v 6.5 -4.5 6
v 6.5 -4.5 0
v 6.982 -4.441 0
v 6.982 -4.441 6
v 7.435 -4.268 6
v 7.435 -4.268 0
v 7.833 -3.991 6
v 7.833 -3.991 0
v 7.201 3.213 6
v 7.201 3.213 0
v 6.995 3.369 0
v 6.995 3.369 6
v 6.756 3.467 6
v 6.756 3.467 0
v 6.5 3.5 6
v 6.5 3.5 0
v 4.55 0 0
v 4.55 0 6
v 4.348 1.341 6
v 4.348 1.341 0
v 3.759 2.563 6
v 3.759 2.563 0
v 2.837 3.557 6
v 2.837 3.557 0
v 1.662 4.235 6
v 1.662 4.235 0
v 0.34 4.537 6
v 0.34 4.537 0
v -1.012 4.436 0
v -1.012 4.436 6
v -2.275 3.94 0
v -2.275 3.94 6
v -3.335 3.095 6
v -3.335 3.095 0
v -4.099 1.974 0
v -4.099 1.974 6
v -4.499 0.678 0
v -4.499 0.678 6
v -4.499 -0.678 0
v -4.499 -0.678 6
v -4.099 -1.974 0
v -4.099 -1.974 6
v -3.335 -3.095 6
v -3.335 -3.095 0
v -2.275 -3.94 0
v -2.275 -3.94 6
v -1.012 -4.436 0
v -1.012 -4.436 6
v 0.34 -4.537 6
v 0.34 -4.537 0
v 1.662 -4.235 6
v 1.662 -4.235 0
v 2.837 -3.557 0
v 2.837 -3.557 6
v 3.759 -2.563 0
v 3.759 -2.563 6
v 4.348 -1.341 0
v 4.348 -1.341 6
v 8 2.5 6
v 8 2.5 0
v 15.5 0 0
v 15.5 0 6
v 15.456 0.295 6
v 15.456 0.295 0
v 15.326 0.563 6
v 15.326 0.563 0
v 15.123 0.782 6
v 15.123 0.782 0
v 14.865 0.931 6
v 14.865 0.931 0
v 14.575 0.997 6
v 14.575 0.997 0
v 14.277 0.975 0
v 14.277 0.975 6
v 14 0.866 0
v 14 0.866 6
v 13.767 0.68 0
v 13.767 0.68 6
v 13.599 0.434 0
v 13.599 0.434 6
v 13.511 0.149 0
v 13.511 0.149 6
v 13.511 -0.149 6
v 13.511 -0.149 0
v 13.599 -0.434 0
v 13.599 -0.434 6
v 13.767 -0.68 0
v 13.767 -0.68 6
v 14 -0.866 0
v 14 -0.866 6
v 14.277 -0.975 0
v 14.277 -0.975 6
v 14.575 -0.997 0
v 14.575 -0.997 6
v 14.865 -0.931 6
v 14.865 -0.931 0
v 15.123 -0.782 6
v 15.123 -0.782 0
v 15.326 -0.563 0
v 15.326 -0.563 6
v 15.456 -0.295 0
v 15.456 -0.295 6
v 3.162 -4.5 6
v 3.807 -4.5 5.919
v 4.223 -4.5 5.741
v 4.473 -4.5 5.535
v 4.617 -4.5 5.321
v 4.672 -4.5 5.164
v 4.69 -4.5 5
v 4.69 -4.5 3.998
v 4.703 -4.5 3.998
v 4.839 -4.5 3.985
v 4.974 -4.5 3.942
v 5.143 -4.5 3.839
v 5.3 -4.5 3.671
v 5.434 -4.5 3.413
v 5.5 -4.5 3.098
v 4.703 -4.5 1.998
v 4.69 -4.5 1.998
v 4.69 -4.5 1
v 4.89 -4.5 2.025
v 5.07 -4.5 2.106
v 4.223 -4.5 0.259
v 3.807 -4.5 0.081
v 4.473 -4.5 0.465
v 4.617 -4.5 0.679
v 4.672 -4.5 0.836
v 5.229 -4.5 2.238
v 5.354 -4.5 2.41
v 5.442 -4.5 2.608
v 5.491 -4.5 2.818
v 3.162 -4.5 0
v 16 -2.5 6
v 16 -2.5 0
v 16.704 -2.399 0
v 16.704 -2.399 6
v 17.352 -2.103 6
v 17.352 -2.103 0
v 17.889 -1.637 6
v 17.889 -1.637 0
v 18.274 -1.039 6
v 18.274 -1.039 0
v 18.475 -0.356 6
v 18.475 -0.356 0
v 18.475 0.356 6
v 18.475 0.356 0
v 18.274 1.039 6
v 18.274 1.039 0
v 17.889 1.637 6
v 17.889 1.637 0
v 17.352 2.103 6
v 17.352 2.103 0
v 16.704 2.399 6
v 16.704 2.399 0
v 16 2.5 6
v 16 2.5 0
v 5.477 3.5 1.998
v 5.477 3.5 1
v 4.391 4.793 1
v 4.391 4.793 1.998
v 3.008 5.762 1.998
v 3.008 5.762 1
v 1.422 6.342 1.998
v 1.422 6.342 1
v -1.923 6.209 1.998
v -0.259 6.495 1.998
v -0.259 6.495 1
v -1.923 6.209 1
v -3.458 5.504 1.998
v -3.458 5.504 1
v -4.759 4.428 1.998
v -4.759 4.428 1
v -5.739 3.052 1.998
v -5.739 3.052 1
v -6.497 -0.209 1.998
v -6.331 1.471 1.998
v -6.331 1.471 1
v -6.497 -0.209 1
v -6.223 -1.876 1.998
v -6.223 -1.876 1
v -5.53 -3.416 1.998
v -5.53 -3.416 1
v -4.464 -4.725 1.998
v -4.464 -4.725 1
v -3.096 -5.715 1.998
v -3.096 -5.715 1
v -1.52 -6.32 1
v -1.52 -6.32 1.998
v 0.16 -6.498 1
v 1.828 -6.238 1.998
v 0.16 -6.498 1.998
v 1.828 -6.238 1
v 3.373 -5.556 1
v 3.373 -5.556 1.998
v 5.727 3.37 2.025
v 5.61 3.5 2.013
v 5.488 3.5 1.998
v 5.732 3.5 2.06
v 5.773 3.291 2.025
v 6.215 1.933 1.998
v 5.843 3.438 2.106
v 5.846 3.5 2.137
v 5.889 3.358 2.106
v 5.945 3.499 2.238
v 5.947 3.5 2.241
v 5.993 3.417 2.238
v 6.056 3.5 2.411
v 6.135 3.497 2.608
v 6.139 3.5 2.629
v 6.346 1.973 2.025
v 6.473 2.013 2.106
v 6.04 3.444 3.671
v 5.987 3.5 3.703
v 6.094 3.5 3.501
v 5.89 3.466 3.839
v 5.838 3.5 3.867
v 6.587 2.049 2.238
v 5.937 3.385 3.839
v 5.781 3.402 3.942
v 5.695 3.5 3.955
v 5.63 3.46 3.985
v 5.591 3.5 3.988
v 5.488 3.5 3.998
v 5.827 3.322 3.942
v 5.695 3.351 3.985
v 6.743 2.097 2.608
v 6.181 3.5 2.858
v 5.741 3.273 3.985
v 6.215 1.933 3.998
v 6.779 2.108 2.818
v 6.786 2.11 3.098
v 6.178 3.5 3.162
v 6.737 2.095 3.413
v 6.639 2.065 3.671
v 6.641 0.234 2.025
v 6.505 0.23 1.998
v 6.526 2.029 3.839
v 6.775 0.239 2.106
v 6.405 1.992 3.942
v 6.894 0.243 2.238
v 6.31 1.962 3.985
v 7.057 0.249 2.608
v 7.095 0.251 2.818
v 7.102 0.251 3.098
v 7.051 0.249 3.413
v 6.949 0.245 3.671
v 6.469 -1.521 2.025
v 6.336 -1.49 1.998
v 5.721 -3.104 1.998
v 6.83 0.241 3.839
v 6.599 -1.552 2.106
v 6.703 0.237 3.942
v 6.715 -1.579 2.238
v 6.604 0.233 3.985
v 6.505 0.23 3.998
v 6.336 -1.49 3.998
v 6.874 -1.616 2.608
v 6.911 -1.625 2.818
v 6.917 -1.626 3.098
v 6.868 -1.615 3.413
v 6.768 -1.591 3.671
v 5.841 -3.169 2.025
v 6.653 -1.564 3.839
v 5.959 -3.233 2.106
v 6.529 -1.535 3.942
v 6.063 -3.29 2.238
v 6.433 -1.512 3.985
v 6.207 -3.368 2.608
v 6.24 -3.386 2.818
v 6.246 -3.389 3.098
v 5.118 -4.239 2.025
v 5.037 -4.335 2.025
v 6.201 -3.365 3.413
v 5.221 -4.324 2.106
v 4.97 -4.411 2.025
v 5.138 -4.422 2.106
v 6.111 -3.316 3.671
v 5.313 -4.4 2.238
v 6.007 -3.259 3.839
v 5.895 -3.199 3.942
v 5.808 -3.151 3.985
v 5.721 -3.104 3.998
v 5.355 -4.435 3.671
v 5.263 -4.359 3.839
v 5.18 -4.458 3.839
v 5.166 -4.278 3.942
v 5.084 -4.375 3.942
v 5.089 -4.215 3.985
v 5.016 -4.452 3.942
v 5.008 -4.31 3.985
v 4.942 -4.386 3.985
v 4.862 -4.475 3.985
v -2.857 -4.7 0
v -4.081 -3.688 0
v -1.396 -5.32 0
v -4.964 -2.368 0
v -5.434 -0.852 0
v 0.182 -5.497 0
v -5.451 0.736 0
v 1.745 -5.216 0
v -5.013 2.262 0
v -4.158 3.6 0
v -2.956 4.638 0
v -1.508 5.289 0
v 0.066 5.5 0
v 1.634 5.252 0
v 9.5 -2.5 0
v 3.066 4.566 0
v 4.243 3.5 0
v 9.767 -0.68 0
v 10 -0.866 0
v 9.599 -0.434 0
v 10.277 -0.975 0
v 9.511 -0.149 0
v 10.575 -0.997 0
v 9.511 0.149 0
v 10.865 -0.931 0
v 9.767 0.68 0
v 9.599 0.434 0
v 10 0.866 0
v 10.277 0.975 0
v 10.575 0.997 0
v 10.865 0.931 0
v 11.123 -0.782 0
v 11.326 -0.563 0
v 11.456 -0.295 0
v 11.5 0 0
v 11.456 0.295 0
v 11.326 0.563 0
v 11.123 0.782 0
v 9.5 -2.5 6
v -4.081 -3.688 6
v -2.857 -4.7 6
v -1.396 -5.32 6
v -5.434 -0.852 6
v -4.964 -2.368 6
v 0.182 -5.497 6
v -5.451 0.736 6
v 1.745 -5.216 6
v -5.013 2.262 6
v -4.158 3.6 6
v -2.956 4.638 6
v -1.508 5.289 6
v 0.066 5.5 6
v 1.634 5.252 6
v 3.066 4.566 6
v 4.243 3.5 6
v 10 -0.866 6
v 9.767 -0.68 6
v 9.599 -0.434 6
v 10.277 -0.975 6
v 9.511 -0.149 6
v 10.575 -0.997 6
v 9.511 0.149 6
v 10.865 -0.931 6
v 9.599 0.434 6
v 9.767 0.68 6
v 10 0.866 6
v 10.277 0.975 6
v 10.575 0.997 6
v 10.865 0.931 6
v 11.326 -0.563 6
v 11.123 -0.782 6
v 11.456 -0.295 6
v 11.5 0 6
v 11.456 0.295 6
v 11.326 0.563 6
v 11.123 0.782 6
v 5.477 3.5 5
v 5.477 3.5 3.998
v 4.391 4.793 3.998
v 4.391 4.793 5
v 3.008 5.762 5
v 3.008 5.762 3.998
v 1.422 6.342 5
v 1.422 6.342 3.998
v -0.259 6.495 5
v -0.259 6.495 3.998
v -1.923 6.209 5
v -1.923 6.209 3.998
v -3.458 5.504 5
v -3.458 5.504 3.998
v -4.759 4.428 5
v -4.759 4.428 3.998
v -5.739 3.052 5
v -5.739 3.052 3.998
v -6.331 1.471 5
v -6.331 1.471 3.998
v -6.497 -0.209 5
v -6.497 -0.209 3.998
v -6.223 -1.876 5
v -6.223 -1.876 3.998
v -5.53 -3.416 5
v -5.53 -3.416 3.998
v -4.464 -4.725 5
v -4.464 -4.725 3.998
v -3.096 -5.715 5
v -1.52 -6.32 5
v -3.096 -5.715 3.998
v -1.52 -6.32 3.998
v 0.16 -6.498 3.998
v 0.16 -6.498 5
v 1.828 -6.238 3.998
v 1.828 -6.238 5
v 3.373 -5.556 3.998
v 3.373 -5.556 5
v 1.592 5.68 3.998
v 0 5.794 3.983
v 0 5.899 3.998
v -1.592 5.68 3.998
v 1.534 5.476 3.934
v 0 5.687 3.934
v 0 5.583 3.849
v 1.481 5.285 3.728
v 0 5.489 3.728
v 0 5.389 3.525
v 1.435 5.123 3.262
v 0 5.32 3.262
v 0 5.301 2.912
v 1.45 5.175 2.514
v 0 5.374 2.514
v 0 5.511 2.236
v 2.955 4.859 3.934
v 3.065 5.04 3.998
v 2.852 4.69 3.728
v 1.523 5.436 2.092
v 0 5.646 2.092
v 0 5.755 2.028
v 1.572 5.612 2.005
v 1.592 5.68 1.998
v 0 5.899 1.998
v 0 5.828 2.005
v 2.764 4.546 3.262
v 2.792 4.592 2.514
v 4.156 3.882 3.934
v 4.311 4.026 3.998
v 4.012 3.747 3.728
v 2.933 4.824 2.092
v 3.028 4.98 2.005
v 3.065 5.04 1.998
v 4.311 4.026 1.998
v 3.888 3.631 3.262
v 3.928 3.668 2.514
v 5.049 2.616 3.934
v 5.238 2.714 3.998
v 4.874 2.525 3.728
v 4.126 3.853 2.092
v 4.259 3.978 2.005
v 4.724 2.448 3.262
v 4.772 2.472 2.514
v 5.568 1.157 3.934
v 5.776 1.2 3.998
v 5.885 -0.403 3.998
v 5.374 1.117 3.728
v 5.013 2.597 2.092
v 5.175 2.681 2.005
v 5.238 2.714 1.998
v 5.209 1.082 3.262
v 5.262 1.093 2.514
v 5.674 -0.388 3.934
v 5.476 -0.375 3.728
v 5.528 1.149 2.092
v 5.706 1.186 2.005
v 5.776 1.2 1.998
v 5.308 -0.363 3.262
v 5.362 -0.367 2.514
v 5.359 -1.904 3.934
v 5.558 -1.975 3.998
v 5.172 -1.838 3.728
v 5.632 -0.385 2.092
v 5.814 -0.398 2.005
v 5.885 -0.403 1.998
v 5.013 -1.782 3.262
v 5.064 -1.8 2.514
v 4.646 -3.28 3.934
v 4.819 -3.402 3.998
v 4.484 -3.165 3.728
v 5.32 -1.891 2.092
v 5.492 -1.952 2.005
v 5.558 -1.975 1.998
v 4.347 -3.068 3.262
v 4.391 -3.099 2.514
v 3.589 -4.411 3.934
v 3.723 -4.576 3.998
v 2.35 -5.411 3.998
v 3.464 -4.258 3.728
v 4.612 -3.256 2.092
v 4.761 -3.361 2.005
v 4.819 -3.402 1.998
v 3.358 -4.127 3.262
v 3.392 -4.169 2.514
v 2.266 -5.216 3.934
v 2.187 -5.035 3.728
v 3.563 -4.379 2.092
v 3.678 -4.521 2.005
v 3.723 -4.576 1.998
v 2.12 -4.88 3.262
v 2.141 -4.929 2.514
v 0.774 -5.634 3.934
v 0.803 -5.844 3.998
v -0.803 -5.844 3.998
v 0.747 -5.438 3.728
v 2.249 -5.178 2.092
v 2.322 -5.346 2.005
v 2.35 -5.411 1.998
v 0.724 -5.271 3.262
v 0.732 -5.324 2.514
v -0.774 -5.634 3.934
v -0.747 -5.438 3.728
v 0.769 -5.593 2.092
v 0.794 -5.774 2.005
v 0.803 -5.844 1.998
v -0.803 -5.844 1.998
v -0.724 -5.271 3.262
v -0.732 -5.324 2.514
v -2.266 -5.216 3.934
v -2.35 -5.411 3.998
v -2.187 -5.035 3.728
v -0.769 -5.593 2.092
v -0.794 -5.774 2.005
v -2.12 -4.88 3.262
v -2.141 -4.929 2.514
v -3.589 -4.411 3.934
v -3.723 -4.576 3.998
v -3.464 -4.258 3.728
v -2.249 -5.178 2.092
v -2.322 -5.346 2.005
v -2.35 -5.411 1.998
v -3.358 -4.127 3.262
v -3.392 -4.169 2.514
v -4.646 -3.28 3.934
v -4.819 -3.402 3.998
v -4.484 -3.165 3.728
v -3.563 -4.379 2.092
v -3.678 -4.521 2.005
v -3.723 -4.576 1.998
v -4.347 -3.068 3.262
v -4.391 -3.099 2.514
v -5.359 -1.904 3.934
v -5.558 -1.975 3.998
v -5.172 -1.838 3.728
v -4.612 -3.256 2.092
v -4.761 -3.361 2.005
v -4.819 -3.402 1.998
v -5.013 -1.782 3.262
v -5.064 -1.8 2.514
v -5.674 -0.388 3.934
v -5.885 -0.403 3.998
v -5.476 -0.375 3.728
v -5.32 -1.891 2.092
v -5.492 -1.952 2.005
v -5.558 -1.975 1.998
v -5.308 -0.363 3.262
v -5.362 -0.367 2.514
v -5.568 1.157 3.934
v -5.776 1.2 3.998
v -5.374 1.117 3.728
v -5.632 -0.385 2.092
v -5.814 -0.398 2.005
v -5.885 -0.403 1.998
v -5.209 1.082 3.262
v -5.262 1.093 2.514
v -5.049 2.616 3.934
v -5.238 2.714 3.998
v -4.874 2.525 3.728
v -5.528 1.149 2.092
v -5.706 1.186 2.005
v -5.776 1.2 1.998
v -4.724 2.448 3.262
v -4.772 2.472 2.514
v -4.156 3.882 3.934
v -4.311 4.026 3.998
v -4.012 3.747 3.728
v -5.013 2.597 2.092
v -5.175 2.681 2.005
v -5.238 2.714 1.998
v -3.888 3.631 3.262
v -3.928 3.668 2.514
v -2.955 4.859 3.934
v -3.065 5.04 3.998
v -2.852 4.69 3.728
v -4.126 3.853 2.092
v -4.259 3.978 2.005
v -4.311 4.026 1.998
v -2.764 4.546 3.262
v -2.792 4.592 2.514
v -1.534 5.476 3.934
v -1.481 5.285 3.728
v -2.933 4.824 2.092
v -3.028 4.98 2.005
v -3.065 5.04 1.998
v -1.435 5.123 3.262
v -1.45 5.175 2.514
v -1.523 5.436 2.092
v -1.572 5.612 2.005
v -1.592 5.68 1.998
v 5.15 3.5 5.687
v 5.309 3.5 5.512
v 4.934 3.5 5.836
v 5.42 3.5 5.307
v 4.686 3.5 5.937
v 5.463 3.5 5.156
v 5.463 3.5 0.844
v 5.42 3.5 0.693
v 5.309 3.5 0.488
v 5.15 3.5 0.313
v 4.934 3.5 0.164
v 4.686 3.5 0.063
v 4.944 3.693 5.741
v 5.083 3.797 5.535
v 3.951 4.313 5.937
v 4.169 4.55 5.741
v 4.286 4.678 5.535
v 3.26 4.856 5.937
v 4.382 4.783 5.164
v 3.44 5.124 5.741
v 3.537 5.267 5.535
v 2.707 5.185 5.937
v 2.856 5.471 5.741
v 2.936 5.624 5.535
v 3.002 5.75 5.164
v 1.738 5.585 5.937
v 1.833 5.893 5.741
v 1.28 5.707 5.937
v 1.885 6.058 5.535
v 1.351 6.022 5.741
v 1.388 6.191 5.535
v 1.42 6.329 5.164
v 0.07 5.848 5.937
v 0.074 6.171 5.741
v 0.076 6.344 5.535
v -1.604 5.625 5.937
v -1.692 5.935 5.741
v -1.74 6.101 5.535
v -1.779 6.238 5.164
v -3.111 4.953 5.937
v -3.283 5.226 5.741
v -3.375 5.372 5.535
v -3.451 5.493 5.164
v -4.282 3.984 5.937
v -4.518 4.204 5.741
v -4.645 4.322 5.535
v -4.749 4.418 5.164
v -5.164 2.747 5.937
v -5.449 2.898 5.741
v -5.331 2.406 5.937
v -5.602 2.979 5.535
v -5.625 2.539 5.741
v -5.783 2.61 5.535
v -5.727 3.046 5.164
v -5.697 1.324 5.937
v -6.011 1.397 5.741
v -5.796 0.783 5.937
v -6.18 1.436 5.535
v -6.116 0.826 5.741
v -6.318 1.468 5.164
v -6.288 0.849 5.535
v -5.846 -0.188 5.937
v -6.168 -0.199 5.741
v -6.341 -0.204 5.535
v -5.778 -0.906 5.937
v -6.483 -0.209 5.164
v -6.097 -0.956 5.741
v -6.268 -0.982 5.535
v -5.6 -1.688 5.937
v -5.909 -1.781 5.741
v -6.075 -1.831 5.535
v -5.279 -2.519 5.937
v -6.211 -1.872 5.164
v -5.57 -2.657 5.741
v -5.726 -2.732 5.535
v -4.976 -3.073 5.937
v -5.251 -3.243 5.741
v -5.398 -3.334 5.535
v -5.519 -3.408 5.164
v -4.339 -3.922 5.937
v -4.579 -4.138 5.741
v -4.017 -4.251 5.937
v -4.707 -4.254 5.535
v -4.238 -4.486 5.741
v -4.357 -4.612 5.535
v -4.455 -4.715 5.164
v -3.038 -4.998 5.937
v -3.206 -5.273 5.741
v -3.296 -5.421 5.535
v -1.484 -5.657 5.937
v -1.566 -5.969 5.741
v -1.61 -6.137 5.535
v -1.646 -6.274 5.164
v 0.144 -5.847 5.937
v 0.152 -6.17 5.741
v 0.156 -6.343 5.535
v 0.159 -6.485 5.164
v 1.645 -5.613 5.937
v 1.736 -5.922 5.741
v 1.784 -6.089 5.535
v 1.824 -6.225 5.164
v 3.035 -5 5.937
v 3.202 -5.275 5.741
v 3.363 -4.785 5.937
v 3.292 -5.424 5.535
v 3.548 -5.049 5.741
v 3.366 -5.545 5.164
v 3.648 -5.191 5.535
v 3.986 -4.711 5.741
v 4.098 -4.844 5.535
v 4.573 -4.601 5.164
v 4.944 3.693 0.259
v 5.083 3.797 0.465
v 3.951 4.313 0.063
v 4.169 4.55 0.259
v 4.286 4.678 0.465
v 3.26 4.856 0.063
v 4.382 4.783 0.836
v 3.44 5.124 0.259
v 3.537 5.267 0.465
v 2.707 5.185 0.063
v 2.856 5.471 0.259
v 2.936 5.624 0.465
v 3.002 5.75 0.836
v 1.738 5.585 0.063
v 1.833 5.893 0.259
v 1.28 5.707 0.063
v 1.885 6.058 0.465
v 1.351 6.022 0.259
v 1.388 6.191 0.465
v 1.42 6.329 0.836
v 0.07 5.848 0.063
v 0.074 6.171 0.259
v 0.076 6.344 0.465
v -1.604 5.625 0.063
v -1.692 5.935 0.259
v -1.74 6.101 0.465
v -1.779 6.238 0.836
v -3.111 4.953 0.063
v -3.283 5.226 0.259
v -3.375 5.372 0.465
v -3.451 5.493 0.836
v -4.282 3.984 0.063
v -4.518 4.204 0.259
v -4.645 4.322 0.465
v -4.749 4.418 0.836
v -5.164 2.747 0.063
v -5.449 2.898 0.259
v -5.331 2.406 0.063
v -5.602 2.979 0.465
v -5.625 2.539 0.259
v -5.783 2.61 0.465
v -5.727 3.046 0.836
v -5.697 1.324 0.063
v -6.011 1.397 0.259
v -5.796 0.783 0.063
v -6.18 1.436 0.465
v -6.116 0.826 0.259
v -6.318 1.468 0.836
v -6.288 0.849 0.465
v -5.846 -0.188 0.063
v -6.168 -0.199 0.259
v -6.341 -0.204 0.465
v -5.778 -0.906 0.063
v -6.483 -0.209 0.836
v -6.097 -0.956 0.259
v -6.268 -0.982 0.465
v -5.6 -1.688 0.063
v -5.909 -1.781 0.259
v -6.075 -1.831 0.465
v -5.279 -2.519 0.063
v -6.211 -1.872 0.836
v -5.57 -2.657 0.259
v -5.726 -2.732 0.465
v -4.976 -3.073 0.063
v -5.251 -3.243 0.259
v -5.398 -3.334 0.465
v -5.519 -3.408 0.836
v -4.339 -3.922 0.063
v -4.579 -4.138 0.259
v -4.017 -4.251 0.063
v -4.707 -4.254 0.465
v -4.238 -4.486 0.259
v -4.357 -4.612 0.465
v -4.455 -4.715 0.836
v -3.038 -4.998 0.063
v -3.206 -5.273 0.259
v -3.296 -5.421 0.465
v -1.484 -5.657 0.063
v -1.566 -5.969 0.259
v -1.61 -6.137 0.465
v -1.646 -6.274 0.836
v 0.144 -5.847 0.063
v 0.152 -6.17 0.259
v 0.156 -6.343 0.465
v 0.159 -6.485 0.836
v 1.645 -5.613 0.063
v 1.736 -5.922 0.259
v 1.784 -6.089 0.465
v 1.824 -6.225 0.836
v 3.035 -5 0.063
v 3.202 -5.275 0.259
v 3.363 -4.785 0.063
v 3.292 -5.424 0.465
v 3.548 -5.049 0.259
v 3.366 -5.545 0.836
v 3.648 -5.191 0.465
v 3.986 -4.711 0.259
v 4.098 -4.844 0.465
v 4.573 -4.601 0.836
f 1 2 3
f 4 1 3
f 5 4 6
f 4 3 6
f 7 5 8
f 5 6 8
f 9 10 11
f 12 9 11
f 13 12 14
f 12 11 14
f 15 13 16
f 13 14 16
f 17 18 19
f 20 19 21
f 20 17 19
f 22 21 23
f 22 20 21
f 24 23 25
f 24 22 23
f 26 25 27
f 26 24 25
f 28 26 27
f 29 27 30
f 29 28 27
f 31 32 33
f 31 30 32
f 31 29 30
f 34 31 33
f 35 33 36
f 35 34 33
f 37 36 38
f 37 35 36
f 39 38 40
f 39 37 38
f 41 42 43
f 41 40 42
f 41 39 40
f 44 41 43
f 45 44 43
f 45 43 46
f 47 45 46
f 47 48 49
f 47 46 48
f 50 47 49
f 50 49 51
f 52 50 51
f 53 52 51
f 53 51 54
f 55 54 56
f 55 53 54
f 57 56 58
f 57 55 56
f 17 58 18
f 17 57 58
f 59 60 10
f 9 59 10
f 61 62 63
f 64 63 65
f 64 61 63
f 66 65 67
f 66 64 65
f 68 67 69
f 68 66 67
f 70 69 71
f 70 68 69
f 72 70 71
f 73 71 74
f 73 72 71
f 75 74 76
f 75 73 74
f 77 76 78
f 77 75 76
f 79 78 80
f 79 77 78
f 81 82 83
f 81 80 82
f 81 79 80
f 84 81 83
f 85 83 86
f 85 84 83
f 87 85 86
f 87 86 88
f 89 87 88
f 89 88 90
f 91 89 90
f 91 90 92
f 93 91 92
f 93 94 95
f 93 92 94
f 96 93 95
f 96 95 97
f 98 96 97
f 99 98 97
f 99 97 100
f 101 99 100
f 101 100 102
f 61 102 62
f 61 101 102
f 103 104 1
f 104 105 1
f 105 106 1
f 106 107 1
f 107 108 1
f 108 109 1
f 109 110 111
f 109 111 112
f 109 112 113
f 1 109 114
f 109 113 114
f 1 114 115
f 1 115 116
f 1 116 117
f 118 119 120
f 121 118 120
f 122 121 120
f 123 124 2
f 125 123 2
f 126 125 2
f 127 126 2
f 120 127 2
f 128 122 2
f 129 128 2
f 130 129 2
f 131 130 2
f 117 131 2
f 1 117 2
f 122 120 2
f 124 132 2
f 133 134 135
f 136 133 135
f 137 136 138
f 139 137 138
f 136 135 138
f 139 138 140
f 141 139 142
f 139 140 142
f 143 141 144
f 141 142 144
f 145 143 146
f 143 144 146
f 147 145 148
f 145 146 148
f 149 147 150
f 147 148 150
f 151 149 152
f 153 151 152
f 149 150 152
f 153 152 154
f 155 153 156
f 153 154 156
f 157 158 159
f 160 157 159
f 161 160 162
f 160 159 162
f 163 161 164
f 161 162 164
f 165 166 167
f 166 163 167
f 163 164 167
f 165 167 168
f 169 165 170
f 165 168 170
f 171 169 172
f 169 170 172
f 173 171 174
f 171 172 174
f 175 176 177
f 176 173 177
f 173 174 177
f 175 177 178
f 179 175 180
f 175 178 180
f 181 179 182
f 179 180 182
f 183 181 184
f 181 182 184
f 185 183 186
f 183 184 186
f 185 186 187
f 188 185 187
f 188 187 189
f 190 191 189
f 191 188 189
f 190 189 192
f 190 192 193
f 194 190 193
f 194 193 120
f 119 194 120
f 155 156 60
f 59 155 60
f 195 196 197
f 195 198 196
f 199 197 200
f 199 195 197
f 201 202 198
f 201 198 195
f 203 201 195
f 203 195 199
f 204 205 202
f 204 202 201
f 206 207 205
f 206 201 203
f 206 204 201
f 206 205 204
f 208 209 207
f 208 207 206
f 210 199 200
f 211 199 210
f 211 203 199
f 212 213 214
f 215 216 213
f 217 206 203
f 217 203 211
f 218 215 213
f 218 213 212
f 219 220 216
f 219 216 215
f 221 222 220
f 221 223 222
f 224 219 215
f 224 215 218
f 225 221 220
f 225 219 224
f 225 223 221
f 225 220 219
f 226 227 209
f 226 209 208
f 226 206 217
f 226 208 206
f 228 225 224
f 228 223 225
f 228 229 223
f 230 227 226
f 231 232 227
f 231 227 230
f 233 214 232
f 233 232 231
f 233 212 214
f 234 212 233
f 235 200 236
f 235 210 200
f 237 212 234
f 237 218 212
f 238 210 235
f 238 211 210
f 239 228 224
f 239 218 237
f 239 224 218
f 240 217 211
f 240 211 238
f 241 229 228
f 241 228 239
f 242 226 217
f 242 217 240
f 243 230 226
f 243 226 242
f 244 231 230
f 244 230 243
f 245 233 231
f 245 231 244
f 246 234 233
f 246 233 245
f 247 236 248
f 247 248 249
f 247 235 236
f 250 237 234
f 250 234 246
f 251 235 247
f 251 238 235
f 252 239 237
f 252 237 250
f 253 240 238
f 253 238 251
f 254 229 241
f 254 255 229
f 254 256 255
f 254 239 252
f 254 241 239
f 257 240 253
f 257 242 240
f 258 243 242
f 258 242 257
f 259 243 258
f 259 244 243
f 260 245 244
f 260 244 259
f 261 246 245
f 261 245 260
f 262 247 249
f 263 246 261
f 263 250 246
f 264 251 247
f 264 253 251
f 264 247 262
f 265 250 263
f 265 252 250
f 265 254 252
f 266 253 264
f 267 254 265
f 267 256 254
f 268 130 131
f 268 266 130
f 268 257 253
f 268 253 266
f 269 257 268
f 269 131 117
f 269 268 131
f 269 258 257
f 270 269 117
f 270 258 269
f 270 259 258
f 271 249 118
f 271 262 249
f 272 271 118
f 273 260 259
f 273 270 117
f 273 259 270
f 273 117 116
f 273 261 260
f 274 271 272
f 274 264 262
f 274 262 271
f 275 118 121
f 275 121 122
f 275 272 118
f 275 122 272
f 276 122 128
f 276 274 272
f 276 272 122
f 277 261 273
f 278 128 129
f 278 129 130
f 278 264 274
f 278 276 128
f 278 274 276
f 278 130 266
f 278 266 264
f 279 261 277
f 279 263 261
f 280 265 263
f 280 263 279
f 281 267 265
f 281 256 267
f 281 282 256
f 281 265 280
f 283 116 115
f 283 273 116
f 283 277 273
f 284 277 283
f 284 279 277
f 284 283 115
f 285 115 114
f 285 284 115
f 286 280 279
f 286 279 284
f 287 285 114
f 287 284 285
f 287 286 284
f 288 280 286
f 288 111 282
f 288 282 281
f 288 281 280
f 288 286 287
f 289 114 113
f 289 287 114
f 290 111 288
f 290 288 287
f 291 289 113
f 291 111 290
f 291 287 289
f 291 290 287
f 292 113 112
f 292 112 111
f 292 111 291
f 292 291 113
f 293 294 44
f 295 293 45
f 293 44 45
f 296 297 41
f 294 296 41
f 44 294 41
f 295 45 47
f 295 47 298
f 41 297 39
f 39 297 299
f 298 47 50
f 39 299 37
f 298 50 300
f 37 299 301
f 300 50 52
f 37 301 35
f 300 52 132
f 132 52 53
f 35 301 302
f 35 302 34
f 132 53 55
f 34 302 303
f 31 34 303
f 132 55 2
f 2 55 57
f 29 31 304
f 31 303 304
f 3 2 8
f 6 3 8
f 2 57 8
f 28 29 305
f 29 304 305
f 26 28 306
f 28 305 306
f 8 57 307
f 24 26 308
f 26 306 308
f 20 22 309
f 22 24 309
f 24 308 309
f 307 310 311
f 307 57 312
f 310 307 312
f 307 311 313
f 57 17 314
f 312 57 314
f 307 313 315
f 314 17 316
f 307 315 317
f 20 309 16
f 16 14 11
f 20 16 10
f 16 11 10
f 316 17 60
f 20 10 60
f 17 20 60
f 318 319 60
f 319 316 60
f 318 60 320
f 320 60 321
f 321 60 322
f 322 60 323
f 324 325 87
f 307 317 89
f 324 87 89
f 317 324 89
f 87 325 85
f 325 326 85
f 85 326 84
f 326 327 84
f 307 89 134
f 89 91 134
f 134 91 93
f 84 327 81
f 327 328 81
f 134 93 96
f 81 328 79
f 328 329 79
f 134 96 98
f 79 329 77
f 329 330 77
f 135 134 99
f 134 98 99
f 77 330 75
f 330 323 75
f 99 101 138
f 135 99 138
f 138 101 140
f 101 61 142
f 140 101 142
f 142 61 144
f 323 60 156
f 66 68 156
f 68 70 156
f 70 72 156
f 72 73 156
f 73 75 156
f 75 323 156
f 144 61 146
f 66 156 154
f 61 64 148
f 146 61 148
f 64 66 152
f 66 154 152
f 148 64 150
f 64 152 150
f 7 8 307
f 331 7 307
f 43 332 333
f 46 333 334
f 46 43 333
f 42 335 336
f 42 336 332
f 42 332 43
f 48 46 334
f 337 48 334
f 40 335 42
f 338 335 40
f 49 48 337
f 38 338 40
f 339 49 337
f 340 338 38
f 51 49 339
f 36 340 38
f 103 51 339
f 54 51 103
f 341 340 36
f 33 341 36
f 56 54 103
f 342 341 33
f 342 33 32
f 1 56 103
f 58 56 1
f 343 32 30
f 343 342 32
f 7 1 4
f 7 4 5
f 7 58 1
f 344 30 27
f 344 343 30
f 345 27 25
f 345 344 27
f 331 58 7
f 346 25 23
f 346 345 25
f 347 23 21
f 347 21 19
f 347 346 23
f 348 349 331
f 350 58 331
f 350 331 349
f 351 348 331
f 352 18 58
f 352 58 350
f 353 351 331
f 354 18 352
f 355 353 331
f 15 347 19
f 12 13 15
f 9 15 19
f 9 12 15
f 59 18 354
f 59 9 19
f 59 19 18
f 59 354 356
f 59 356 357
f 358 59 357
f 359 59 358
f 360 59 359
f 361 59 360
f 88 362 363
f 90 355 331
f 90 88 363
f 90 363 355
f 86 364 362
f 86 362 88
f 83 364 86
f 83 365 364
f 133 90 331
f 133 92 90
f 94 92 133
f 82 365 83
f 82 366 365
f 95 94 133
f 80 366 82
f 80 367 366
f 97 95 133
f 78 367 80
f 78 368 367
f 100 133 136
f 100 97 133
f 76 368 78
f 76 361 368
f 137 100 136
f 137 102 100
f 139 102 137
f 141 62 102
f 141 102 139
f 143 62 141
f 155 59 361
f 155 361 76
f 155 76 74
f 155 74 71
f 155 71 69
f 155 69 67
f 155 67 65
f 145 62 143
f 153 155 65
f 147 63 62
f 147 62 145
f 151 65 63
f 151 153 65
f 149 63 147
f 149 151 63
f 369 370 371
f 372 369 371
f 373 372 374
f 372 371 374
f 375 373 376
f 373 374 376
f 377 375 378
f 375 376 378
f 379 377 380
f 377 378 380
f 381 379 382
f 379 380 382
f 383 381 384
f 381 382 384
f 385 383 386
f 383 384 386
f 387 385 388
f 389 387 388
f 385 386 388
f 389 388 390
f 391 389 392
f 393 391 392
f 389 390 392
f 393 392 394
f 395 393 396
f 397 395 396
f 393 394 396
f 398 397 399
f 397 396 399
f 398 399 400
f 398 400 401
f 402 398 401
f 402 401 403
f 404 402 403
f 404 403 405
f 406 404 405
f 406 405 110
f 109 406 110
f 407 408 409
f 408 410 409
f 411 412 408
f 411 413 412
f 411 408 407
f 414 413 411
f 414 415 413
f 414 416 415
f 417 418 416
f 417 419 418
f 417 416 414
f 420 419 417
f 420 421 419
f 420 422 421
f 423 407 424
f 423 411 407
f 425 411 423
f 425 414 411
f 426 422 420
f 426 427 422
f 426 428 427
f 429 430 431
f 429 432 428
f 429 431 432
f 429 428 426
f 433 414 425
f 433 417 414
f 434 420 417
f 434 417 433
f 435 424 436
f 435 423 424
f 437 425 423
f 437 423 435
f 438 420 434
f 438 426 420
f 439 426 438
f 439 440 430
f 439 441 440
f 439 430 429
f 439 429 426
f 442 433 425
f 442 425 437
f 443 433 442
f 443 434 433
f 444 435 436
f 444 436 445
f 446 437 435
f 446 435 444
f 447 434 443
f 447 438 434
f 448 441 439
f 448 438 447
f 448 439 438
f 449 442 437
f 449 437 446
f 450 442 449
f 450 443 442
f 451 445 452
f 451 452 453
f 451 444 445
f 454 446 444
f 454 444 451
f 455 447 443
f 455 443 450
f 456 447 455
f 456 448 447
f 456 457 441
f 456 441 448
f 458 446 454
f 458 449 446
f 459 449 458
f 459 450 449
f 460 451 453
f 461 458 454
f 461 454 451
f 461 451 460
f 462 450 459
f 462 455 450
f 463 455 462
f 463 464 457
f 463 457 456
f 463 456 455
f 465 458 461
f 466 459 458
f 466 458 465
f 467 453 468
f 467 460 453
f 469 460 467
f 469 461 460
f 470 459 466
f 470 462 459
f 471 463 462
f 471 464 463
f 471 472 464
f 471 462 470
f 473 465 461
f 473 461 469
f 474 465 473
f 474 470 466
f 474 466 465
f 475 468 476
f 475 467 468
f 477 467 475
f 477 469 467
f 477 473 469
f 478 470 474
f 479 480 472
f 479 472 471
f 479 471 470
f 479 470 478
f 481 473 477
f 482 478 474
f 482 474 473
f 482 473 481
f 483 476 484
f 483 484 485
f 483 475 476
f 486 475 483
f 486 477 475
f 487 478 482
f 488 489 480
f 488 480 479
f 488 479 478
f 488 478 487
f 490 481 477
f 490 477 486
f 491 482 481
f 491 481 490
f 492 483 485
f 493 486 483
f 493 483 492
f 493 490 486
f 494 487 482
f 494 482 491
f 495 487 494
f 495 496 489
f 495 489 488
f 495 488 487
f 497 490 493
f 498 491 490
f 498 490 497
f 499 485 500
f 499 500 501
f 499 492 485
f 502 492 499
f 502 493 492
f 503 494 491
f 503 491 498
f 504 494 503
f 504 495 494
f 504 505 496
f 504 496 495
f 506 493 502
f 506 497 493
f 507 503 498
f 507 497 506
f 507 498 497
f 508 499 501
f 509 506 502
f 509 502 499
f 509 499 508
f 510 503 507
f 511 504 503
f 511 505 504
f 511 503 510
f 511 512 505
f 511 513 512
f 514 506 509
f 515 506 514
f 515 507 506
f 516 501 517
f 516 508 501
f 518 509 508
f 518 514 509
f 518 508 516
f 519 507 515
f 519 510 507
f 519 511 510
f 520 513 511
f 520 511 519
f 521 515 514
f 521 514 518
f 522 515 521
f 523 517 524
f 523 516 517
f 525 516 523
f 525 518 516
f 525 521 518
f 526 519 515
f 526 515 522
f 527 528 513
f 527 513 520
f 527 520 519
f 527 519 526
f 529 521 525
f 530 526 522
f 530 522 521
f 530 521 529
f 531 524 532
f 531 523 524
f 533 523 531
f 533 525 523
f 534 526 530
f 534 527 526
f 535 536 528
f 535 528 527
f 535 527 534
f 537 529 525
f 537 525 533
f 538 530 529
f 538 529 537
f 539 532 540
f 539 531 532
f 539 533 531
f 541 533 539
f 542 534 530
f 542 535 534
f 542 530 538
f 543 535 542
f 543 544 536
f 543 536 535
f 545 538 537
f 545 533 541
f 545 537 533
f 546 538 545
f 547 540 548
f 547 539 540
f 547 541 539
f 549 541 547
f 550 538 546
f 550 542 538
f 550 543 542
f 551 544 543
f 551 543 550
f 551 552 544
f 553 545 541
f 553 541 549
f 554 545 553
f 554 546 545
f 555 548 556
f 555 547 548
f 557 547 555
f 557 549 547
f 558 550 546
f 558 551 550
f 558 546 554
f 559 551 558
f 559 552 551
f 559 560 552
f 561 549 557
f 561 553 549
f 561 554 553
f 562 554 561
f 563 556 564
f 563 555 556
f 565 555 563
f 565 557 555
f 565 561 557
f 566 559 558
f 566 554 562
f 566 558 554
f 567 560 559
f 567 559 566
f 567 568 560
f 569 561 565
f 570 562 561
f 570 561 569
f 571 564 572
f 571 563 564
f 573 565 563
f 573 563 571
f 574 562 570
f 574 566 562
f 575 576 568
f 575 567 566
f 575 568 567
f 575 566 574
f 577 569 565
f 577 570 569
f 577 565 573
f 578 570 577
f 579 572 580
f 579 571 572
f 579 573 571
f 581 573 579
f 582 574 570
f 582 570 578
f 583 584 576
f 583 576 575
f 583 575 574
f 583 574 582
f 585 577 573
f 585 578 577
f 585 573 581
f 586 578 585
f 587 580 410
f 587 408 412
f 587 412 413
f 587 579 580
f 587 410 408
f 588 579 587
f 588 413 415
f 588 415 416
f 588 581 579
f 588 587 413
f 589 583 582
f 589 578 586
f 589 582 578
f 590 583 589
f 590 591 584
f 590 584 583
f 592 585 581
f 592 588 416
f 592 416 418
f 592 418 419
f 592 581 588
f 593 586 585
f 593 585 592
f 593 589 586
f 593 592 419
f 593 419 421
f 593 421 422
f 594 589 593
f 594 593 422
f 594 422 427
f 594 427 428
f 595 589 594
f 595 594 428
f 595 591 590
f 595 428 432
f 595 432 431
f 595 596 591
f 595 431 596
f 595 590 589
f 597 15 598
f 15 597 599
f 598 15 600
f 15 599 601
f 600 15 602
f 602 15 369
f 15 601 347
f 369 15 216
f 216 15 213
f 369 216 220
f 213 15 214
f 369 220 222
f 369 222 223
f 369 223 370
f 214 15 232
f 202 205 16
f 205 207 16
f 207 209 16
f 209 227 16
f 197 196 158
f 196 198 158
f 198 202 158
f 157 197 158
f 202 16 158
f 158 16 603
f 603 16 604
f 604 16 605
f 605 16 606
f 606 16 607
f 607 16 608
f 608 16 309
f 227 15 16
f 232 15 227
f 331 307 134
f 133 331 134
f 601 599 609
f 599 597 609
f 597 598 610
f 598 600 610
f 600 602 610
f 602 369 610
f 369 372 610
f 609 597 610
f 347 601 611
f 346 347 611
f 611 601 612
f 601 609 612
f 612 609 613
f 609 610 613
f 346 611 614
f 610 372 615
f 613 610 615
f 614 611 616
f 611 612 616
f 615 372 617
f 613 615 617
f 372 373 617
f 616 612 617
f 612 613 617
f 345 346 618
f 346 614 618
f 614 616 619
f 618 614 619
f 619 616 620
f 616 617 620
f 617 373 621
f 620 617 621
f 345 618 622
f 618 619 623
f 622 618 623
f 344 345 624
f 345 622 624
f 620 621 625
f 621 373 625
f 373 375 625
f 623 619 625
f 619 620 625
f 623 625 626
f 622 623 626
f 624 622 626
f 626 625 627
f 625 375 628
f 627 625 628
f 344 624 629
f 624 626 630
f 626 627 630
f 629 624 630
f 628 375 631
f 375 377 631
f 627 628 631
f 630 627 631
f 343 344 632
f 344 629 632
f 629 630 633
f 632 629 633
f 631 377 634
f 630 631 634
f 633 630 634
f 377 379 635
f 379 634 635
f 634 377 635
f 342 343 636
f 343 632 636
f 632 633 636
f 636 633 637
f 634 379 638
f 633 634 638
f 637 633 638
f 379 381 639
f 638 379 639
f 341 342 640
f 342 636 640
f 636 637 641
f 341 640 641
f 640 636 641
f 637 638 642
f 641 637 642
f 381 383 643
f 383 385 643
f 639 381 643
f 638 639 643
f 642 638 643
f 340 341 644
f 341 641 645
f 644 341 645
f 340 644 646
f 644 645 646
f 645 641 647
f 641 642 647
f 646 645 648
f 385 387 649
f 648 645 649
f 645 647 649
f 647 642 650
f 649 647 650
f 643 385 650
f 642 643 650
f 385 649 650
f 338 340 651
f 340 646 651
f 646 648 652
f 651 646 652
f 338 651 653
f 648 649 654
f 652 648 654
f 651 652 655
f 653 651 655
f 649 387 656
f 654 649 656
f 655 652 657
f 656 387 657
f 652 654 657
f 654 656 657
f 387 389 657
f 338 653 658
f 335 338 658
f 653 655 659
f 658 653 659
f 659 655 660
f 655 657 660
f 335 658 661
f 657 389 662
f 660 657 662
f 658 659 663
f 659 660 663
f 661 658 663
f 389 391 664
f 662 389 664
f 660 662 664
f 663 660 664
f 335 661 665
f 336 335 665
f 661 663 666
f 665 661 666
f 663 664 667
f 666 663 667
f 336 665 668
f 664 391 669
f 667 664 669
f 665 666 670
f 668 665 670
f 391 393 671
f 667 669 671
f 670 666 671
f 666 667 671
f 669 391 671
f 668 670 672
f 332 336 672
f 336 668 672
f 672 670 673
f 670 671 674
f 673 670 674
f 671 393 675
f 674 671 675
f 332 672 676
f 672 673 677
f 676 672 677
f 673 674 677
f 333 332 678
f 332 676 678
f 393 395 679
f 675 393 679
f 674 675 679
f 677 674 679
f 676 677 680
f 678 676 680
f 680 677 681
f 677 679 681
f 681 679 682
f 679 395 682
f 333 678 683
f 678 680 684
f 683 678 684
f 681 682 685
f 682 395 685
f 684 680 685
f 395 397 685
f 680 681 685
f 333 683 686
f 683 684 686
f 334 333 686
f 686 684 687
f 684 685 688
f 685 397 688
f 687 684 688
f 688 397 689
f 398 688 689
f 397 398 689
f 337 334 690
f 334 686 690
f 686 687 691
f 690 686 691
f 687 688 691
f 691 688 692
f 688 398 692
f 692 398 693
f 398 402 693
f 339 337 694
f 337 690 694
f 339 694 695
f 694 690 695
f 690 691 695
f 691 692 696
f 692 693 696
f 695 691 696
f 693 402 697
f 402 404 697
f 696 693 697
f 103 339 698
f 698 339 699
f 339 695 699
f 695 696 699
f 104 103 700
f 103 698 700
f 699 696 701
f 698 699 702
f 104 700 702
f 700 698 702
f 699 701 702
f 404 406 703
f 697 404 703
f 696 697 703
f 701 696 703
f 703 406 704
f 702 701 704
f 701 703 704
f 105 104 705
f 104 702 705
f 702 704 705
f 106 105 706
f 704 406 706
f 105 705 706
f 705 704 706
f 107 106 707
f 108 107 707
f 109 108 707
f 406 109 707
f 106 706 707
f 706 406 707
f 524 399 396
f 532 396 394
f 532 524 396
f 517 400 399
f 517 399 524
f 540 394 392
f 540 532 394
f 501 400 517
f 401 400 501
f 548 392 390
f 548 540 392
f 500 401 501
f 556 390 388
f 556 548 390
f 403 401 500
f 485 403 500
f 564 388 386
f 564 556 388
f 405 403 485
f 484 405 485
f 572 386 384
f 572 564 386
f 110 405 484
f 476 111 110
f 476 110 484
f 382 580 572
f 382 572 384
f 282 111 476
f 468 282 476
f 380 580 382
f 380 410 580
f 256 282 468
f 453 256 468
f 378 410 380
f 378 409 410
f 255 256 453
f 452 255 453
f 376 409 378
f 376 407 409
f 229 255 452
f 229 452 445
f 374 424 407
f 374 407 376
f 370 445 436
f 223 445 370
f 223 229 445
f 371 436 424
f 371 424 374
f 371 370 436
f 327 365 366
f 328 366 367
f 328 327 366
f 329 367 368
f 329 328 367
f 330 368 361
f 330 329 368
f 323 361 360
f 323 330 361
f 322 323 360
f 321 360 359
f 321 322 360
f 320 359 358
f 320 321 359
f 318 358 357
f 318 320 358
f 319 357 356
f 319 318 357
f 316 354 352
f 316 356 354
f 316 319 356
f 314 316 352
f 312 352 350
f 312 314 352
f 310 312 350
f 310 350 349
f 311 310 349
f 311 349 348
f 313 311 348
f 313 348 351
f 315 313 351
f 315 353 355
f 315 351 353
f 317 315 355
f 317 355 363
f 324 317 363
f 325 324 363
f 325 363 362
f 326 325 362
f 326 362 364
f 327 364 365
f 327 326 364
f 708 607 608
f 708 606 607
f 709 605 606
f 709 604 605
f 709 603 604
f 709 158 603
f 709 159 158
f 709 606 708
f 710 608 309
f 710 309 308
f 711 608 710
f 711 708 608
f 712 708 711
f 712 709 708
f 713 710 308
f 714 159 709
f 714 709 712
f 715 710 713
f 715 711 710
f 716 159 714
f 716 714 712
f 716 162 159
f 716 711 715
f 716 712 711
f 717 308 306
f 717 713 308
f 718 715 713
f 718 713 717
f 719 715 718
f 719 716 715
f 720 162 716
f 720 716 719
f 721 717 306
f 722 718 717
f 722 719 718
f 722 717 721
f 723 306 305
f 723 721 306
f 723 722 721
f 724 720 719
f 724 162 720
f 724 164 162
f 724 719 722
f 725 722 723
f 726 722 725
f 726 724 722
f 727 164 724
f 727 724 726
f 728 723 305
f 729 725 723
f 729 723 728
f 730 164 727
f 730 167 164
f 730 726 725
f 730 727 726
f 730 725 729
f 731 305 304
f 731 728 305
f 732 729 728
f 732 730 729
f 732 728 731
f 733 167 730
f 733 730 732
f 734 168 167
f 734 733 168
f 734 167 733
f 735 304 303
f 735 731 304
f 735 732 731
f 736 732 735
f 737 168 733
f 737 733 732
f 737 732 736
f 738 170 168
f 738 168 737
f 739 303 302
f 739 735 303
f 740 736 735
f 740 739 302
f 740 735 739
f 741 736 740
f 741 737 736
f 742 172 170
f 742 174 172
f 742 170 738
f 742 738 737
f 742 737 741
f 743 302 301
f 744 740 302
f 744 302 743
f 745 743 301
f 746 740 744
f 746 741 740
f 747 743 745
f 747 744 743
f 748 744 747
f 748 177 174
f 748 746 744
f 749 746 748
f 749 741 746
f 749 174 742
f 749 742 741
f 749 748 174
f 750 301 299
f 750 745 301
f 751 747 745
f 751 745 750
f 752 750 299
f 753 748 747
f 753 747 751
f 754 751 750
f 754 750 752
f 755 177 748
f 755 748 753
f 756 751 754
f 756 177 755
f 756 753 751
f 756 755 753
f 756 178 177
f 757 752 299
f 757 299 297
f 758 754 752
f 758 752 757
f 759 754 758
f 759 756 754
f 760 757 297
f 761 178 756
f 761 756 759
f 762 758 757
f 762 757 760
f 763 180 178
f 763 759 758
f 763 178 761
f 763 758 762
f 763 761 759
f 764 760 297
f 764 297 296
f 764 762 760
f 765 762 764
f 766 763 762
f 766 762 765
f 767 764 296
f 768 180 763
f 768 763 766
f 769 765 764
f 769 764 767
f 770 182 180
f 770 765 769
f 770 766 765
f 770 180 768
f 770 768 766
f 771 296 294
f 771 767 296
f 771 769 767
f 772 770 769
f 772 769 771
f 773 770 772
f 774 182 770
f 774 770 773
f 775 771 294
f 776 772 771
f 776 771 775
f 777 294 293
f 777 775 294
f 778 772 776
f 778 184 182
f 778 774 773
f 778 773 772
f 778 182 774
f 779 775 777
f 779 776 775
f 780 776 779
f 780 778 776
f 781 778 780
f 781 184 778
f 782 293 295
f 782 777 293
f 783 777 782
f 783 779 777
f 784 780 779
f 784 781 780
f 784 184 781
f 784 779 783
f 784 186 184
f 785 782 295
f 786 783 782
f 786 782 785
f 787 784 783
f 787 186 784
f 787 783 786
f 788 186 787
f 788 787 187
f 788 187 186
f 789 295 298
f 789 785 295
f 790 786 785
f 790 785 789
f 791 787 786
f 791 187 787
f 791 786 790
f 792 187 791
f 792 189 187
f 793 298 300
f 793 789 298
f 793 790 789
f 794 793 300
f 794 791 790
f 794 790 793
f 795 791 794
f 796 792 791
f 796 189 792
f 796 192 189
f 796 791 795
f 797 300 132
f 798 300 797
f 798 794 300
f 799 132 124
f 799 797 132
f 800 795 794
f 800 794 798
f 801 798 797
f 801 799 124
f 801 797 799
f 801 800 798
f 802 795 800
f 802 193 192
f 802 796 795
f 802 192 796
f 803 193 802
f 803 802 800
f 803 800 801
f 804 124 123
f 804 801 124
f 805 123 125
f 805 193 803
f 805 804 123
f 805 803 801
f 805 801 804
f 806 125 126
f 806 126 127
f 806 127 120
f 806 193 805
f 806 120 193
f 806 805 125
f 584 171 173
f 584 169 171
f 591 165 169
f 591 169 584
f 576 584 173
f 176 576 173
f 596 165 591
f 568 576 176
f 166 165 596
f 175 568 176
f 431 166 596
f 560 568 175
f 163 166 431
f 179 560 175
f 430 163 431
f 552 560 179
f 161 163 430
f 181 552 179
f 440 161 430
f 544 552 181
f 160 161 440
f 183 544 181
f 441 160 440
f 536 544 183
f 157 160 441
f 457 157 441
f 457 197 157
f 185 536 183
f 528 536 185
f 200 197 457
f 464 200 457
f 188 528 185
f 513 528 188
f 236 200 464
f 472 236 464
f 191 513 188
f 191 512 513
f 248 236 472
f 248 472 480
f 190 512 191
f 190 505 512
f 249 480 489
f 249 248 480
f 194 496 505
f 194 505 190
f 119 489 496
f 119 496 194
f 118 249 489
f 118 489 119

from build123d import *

# Parameters (mm, degrees)
BOSS_EXTRUDE1_DEPTH = 6
SKETCH1_5_R         = 4.55
CUT_EXTRUDE2_DEPTH  = 21.506096654
SKETCH1_6_R         = 1
CUT_EXTRUDE3_DEPTH  = 21.506096654
FILLET1_R           = 1


with BuildPart() as part:
    # Sketch1 → Boss-Extrude1 (new body)
    with BuildSketch(Plane.XY):
        with BuildLine():
            Line((9.5, -2.5), (16, -2.5))
            ThreePointArc((16, -2.5), (18.5, 0), (16, 2.5))
            Line((16, 2.5), (8, 2.5))
            Line((8, 2.5), (7.201136344, 3.213027227))
            ThreePointArc((7.201136344, 3.213027227), (6.878795969, 3.425480207), (6.5, 3.5))
            Line((6.5, 3.5), (5.477225575, 3.5))
            ThreePointArc((5.477225575, 3.5), (-6.468789112, 0.636213346), (4.69041576, -4.5))
            Line((4.69041576, -4.5), (6.5, -4.5))
            ThreePointArc((6.5, -4.5), (7.21364418, -4.368344718), (7.833333333, -3.990711985))
            Line((7.833333333, -3.990711985), (9.5, -2.5))
        make_face()
    extrude(amount=BOSS_EXTRUDE1_DEPTH)

    # Sketch1_5 → Cut-Extrude2 (cut, through all)
    with BuildSketch(Plane.XY):
        Circle(SKETCH1_5_R)
    extrude(amount=CUT_EXTRUDE2_DEPTH, mode=Mode.SUBTRACT)

    # Sketch1_6 → Cut-Extrude3 (cut, through all)
    with BuildSketch(Plane.XY):
        with Locations((14.5, 0)):
            Circle(SKETCH1_6_R)
        with Locations((10.5, 0)):
            Circle(SKETCH1_6_R)
    extrude(amount=CUT_EXTRUDE3_DEPTH, mode=Mode.SUBTRACT)

    # Sketch5 → Cut-Revolve2 (revolve, cut)
    with BuildSketch(Plane(origin=(0, 0, 0), x_dir=(0, 0, -1), z_dir=(1, 0, 0))):
        with BuildLine():
            Line((-3.998431193, 6.509033472), (-3.998431193, 5.899033472))
            add(Edge.make_bspline(
                [(-3.998431193, 5.899033472), (-3.998431193, 5.299033472), (-2.998431193, 5.299033472), (-1.998431193, 5.299033472), (-1.998431193, 5.899033472)],
                knots=[0, 0, 0, 1.570796327, 1.570796327, 3.141592654, 3.141592654, 3.141592654], degree=2, weights=[1, 0.707106781, 1, 0.707106781, 1]))
            Line((-1.998431193, 5.899033472), (-1.998431193, 6.509033472))
            add(Edge.make_bspline(
                [(-1.998431193, 6.509033472), (-1.998431193, 7.109033472), (-2.998431193, 7.109033472), (-3.998431193, 7.109033472), (-3.998431193, 6.509033472)],
                knots=[3.141592654, 3.141592654, 3.141592654, 4.71238898, 4.71238898, 6.283185307, 6.283185307, 6.283185307], degree=2, weights=[1, 0.707106781, 1, 0.707106781, 1]))
        make_face()
    revolve(axis=Axis((0, 0, 6.969963605), (0, 0, -1)), mode=Mode.SUBTRACT)

    # Fillet1
    fillet1_edges = [part.edges().sort_by_distance(p)[0] for p in [
        (-6.468789112, 0.636213346, 0),
        (-6.468789112, 0.636213346, 6),
    ]]
    fillet(fillet1_edges, radius=FILLET1_R)


solid = part.part
